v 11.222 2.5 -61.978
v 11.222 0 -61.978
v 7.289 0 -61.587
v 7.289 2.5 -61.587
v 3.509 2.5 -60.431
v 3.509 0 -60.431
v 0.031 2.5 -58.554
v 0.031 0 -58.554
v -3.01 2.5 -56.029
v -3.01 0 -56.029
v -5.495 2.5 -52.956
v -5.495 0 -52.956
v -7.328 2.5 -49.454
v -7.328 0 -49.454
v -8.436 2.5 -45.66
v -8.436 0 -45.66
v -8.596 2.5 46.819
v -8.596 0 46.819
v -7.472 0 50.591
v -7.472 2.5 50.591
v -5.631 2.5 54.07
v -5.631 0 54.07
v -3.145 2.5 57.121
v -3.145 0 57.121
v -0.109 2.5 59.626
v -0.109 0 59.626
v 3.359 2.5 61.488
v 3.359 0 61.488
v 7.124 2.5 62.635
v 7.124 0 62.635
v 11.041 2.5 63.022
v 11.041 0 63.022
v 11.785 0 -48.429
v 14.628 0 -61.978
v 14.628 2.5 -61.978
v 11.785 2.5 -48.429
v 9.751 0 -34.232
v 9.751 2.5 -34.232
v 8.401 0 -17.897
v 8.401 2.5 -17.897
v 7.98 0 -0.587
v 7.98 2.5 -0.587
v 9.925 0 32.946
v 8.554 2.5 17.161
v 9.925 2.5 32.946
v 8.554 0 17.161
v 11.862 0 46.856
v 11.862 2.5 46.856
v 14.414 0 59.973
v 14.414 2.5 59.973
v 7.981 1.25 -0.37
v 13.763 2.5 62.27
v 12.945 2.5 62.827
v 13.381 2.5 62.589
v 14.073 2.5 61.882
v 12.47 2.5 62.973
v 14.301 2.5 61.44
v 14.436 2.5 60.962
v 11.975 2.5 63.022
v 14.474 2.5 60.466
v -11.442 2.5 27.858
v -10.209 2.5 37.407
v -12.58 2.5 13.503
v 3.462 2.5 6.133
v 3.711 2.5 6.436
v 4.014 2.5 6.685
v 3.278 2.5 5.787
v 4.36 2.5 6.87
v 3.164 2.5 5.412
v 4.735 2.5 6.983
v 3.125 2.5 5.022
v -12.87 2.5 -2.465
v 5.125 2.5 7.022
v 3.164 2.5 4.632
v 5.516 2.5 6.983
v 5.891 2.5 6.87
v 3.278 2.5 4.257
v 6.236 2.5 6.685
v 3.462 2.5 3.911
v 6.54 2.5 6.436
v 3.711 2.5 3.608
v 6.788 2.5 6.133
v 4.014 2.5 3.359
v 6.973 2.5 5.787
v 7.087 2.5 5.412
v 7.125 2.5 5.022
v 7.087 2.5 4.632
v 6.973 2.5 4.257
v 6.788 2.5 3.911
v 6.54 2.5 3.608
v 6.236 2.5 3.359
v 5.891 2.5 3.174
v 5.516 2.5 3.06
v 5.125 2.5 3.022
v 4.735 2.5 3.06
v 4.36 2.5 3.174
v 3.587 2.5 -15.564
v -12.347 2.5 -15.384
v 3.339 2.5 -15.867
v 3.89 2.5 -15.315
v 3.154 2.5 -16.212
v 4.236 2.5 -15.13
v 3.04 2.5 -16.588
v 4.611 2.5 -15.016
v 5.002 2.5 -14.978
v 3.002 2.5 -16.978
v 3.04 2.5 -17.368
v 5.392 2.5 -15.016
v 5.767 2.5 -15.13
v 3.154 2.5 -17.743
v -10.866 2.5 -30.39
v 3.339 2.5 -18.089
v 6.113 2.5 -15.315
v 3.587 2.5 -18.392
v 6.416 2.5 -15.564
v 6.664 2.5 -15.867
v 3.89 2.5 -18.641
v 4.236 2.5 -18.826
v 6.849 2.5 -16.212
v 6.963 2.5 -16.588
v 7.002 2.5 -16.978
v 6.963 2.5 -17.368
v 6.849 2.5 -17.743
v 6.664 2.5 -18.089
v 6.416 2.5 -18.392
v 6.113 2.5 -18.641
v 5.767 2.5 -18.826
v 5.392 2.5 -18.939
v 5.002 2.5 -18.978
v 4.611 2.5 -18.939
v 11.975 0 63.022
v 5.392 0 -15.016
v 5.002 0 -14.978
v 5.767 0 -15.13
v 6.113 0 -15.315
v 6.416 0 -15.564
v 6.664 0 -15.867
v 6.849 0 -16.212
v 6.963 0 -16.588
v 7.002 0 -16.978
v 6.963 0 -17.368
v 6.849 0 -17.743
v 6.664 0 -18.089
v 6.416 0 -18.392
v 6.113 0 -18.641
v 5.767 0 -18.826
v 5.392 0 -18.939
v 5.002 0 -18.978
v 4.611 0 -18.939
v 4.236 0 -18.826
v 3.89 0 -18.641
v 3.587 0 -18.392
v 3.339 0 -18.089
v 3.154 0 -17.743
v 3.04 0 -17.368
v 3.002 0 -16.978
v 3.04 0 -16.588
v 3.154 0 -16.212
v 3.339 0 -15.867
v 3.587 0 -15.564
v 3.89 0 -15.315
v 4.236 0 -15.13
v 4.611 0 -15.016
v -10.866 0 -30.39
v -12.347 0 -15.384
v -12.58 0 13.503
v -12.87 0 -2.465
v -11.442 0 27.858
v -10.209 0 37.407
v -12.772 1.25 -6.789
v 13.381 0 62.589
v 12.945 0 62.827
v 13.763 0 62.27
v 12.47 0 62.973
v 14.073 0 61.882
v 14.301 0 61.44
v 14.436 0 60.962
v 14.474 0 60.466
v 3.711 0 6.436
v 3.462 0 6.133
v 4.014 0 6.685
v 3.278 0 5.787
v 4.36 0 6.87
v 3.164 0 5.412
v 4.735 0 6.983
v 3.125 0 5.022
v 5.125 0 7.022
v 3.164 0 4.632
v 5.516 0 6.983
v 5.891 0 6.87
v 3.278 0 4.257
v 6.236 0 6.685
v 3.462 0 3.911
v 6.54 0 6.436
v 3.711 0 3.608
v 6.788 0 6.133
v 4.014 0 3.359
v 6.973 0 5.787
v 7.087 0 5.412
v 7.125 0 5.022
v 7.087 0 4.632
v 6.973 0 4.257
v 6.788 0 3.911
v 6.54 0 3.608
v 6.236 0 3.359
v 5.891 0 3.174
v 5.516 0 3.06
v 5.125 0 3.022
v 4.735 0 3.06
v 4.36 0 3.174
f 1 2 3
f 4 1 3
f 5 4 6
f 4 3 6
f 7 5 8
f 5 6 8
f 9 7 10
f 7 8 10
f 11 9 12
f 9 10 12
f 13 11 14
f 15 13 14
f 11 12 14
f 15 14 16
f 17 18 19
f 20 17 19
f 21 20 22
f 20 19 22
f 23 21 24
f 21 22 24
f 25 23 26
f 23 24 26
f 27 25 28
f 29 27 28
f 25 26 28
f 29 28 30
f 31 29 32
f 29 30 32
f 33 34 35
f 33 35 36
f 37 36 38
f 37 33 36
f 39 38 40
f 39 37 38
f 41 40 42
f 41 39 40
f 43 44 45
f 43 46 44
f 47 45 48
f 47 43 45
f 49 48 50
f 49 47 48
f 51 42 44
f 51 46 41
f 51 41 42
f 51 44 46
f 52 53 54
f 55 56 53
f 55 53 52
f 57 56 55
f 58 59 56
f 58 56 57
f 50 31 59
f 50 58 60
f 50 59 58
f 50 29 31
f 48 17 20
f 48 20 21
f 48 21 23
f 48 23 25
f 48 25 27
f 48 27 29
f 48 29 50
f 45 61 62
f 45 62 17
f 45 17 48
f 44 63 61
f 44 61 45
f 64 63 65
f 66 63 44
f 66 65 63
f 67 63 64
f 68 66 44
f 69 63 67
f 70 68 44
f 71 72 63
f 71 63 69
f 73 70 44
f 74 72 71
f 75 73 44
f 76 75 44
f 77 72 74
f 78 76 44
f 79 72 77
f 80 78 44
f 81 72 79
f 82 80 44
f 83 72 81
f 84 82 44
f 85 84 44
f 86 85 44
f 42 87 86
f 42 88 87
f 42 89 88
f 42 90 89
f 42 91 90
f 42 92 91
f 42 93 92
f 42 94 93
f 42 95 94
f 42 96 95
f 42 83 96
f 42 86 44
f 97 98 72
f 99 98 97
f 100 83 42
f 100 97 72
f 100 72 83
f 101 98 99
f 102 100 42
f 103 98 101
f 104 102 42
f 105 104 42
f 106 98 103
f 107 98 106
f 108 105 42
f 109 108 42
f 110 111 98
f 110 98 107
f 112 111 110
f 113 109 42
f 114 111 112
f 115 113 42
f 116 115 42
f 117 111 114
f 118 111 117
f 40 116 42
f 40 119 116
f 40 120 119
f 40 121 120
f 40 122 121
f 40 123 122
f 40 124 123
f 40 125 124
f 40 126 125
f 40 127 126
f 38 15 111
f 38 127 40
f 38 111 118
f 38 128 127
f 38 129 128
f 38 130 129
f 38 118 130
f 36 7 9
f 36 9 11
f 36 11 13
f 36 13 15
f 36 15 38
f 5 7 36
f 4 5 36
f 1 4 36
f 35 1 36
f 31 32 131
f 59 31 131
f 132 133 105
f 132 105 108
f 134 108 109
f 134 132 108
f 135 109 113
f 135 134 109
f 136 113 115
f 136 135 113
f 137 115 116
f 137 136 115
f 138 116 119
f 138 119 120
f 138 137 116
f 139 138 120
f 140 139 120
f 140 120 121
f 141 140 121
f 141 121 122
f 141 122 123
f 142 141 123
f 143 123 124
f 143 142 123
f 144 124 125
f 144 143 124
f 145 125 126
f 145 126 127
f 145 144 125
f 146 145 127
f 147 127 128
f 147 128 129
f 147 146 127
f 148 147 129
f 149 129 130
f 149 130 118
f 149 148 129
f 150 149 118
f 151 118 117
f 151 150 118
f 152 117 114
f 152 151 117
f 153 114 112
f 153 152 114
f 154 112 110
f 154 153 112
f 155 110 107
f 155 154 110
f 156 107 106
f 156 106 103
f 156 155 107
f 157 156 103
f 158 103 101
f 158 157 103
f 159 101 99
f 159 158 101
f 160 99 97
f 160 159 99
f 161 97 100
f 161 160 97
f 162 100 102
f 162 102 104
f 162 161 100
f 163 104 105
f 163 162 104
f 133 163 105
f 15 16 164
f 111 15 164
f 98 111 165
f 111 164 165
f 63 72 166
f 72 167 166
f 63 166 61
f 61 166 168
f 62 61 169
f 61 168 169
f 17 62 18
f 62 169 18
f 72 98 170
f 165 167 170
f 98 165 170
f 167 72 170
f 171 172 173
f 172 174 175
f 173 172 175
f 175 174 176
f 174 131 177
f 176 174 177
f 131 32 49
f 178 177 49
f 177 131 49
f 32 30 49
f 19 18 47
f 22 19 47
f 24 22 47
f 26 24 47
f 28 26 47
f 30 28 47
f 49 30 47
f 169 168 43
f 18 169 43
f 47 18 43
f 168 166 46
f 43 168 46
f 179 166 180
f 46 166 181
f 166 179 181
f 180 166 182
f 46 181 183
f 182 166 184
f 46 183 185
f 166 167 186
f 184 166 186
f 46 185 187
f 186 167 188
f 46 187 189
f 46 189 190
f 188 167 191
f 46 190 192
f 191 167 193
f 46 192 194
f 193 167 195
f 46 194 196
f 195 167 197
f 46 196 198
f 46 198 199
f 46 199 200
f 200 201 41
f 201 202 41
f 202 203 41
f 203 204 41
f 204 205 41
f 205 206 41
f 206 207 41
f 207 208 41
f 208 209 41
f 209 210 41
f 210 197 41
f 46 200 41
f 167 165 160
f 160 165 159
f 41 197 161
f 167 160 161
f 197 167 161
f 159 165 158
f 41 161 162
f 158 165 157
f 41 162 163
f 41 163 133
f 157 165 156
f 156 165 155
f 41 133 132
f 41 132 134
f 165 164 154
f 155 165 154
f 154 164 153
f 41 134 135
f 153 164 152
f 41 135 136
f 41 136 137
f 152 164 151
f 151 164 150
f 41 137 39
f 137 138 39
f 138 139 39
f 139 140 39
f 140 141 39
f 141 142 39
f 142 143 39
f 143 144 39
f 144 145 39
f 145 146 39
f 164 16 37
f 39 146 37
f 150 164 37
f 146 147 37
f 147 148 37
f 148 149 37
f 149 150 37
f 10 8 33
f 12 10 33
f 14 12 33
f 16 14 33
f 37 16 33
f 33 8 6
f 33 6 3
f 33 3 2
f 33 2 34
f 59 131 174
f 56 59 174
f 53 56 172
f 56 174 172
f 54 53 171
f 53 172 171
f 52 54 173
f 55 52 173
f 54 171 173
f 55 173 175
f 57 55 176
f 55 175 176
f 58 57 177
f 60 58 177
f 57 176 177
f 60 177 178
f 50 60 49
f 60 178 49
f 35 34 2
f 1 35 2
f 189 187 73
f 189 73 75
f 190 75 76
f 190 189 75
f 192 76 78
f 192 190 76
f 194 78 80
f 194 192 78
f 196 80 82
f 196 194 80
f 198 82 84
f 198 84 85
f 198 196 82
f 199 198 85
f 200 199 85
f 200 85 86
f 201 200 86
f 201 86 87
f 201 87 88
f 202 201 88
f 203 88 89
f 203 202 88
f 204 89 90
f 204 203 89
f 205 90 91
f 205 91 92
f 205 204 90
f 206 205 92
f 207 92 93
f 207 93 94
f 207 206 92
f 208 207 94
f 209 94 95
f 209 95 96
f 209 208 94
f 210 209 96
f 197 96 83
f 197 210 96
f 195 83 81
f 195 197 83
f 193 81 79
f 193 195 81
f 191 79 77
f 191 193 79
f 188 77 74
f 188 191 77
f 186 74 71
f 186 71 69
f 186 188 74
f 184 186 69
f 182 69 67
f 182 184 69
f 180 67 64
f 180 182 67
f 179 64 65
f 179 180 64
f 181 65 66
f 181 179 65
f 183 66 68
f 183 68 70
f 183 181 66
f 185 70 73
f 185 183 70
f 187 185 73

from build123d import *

# Parameters (mm, degrees)
ESBO_O1_R                = 2
RESSALTO_EXTRUS_O1_DEPTH = 2.5


with BuildPart() as part:
    # Esboço1 → Ressalto-extrusão1 (new body)
    with BuildSketch(Plane(origin=(0, 0, 0), x_dir=(1, 0, 0), z_dir=(0, 1, 0))):
        with BuildLine():
            Line((11.040621421, -63.022227155), (11.975083319, -63.022227155))
            ThreePointArc((11.975083319, -63.022227155), (13.927517872, -62.083636556), (14.413923052, -59.972626609))
            add(Edge.make_bspline(
                [(14.628150734, 61.977772845), (9.961904295, 43.145041124), (5.80089976, 0.158887719), (10.360032358, -41.983580286), (14.413923052, -59.972626609)],
                knots=[0, 0, 0, 0, 0.486126784, 0.972253568, 0.972253568, 0.972253568, 0.972253568], degree=3))
            Line((14.628150734, 61.977772845), (11.221984798, 61.977772845))
            ThreePointArc((11.221984798, 61.977772845), (-1.551940129, 57.366952224), (-8.43603741, 45.660457041))
            add(Edge.make_bspline(
                [(-8.43603741, 45.660457041), (-10.928367674, 32.356496924), (-14.334494692, 2.382887461), (-11.960473063, -29.417729259), (-8.595648838, -46.819185188)],
                knots=[0.126810365, 0.126810365, 0.126810365, 0.126810365, 0.438278248, 0.866480416, 0.866480416, 0.866480416, 0.866480416], degree=3))
            ThreePointArc((-8.595648838, -46.819185188), (-1.688495582, -58.448489837), (11.040621421, -63.022227155))
        make_face()
        with Locations(Location((5.00152215, 16.977772845, 0), (0, 0, 270))):
            Circle(ESBO_O1_R, mode=Mode.SUBTRACT)
        with Locations(Location((5.125334517, -5.021878755, 0), (0, 0, 270))):
            Circle(ESBO_O1_R, mode=Mode.SUBTRACT)
    extrude(amount=RESSALTO_EXTRUS_O1_DEPTH)


solid = part.part
